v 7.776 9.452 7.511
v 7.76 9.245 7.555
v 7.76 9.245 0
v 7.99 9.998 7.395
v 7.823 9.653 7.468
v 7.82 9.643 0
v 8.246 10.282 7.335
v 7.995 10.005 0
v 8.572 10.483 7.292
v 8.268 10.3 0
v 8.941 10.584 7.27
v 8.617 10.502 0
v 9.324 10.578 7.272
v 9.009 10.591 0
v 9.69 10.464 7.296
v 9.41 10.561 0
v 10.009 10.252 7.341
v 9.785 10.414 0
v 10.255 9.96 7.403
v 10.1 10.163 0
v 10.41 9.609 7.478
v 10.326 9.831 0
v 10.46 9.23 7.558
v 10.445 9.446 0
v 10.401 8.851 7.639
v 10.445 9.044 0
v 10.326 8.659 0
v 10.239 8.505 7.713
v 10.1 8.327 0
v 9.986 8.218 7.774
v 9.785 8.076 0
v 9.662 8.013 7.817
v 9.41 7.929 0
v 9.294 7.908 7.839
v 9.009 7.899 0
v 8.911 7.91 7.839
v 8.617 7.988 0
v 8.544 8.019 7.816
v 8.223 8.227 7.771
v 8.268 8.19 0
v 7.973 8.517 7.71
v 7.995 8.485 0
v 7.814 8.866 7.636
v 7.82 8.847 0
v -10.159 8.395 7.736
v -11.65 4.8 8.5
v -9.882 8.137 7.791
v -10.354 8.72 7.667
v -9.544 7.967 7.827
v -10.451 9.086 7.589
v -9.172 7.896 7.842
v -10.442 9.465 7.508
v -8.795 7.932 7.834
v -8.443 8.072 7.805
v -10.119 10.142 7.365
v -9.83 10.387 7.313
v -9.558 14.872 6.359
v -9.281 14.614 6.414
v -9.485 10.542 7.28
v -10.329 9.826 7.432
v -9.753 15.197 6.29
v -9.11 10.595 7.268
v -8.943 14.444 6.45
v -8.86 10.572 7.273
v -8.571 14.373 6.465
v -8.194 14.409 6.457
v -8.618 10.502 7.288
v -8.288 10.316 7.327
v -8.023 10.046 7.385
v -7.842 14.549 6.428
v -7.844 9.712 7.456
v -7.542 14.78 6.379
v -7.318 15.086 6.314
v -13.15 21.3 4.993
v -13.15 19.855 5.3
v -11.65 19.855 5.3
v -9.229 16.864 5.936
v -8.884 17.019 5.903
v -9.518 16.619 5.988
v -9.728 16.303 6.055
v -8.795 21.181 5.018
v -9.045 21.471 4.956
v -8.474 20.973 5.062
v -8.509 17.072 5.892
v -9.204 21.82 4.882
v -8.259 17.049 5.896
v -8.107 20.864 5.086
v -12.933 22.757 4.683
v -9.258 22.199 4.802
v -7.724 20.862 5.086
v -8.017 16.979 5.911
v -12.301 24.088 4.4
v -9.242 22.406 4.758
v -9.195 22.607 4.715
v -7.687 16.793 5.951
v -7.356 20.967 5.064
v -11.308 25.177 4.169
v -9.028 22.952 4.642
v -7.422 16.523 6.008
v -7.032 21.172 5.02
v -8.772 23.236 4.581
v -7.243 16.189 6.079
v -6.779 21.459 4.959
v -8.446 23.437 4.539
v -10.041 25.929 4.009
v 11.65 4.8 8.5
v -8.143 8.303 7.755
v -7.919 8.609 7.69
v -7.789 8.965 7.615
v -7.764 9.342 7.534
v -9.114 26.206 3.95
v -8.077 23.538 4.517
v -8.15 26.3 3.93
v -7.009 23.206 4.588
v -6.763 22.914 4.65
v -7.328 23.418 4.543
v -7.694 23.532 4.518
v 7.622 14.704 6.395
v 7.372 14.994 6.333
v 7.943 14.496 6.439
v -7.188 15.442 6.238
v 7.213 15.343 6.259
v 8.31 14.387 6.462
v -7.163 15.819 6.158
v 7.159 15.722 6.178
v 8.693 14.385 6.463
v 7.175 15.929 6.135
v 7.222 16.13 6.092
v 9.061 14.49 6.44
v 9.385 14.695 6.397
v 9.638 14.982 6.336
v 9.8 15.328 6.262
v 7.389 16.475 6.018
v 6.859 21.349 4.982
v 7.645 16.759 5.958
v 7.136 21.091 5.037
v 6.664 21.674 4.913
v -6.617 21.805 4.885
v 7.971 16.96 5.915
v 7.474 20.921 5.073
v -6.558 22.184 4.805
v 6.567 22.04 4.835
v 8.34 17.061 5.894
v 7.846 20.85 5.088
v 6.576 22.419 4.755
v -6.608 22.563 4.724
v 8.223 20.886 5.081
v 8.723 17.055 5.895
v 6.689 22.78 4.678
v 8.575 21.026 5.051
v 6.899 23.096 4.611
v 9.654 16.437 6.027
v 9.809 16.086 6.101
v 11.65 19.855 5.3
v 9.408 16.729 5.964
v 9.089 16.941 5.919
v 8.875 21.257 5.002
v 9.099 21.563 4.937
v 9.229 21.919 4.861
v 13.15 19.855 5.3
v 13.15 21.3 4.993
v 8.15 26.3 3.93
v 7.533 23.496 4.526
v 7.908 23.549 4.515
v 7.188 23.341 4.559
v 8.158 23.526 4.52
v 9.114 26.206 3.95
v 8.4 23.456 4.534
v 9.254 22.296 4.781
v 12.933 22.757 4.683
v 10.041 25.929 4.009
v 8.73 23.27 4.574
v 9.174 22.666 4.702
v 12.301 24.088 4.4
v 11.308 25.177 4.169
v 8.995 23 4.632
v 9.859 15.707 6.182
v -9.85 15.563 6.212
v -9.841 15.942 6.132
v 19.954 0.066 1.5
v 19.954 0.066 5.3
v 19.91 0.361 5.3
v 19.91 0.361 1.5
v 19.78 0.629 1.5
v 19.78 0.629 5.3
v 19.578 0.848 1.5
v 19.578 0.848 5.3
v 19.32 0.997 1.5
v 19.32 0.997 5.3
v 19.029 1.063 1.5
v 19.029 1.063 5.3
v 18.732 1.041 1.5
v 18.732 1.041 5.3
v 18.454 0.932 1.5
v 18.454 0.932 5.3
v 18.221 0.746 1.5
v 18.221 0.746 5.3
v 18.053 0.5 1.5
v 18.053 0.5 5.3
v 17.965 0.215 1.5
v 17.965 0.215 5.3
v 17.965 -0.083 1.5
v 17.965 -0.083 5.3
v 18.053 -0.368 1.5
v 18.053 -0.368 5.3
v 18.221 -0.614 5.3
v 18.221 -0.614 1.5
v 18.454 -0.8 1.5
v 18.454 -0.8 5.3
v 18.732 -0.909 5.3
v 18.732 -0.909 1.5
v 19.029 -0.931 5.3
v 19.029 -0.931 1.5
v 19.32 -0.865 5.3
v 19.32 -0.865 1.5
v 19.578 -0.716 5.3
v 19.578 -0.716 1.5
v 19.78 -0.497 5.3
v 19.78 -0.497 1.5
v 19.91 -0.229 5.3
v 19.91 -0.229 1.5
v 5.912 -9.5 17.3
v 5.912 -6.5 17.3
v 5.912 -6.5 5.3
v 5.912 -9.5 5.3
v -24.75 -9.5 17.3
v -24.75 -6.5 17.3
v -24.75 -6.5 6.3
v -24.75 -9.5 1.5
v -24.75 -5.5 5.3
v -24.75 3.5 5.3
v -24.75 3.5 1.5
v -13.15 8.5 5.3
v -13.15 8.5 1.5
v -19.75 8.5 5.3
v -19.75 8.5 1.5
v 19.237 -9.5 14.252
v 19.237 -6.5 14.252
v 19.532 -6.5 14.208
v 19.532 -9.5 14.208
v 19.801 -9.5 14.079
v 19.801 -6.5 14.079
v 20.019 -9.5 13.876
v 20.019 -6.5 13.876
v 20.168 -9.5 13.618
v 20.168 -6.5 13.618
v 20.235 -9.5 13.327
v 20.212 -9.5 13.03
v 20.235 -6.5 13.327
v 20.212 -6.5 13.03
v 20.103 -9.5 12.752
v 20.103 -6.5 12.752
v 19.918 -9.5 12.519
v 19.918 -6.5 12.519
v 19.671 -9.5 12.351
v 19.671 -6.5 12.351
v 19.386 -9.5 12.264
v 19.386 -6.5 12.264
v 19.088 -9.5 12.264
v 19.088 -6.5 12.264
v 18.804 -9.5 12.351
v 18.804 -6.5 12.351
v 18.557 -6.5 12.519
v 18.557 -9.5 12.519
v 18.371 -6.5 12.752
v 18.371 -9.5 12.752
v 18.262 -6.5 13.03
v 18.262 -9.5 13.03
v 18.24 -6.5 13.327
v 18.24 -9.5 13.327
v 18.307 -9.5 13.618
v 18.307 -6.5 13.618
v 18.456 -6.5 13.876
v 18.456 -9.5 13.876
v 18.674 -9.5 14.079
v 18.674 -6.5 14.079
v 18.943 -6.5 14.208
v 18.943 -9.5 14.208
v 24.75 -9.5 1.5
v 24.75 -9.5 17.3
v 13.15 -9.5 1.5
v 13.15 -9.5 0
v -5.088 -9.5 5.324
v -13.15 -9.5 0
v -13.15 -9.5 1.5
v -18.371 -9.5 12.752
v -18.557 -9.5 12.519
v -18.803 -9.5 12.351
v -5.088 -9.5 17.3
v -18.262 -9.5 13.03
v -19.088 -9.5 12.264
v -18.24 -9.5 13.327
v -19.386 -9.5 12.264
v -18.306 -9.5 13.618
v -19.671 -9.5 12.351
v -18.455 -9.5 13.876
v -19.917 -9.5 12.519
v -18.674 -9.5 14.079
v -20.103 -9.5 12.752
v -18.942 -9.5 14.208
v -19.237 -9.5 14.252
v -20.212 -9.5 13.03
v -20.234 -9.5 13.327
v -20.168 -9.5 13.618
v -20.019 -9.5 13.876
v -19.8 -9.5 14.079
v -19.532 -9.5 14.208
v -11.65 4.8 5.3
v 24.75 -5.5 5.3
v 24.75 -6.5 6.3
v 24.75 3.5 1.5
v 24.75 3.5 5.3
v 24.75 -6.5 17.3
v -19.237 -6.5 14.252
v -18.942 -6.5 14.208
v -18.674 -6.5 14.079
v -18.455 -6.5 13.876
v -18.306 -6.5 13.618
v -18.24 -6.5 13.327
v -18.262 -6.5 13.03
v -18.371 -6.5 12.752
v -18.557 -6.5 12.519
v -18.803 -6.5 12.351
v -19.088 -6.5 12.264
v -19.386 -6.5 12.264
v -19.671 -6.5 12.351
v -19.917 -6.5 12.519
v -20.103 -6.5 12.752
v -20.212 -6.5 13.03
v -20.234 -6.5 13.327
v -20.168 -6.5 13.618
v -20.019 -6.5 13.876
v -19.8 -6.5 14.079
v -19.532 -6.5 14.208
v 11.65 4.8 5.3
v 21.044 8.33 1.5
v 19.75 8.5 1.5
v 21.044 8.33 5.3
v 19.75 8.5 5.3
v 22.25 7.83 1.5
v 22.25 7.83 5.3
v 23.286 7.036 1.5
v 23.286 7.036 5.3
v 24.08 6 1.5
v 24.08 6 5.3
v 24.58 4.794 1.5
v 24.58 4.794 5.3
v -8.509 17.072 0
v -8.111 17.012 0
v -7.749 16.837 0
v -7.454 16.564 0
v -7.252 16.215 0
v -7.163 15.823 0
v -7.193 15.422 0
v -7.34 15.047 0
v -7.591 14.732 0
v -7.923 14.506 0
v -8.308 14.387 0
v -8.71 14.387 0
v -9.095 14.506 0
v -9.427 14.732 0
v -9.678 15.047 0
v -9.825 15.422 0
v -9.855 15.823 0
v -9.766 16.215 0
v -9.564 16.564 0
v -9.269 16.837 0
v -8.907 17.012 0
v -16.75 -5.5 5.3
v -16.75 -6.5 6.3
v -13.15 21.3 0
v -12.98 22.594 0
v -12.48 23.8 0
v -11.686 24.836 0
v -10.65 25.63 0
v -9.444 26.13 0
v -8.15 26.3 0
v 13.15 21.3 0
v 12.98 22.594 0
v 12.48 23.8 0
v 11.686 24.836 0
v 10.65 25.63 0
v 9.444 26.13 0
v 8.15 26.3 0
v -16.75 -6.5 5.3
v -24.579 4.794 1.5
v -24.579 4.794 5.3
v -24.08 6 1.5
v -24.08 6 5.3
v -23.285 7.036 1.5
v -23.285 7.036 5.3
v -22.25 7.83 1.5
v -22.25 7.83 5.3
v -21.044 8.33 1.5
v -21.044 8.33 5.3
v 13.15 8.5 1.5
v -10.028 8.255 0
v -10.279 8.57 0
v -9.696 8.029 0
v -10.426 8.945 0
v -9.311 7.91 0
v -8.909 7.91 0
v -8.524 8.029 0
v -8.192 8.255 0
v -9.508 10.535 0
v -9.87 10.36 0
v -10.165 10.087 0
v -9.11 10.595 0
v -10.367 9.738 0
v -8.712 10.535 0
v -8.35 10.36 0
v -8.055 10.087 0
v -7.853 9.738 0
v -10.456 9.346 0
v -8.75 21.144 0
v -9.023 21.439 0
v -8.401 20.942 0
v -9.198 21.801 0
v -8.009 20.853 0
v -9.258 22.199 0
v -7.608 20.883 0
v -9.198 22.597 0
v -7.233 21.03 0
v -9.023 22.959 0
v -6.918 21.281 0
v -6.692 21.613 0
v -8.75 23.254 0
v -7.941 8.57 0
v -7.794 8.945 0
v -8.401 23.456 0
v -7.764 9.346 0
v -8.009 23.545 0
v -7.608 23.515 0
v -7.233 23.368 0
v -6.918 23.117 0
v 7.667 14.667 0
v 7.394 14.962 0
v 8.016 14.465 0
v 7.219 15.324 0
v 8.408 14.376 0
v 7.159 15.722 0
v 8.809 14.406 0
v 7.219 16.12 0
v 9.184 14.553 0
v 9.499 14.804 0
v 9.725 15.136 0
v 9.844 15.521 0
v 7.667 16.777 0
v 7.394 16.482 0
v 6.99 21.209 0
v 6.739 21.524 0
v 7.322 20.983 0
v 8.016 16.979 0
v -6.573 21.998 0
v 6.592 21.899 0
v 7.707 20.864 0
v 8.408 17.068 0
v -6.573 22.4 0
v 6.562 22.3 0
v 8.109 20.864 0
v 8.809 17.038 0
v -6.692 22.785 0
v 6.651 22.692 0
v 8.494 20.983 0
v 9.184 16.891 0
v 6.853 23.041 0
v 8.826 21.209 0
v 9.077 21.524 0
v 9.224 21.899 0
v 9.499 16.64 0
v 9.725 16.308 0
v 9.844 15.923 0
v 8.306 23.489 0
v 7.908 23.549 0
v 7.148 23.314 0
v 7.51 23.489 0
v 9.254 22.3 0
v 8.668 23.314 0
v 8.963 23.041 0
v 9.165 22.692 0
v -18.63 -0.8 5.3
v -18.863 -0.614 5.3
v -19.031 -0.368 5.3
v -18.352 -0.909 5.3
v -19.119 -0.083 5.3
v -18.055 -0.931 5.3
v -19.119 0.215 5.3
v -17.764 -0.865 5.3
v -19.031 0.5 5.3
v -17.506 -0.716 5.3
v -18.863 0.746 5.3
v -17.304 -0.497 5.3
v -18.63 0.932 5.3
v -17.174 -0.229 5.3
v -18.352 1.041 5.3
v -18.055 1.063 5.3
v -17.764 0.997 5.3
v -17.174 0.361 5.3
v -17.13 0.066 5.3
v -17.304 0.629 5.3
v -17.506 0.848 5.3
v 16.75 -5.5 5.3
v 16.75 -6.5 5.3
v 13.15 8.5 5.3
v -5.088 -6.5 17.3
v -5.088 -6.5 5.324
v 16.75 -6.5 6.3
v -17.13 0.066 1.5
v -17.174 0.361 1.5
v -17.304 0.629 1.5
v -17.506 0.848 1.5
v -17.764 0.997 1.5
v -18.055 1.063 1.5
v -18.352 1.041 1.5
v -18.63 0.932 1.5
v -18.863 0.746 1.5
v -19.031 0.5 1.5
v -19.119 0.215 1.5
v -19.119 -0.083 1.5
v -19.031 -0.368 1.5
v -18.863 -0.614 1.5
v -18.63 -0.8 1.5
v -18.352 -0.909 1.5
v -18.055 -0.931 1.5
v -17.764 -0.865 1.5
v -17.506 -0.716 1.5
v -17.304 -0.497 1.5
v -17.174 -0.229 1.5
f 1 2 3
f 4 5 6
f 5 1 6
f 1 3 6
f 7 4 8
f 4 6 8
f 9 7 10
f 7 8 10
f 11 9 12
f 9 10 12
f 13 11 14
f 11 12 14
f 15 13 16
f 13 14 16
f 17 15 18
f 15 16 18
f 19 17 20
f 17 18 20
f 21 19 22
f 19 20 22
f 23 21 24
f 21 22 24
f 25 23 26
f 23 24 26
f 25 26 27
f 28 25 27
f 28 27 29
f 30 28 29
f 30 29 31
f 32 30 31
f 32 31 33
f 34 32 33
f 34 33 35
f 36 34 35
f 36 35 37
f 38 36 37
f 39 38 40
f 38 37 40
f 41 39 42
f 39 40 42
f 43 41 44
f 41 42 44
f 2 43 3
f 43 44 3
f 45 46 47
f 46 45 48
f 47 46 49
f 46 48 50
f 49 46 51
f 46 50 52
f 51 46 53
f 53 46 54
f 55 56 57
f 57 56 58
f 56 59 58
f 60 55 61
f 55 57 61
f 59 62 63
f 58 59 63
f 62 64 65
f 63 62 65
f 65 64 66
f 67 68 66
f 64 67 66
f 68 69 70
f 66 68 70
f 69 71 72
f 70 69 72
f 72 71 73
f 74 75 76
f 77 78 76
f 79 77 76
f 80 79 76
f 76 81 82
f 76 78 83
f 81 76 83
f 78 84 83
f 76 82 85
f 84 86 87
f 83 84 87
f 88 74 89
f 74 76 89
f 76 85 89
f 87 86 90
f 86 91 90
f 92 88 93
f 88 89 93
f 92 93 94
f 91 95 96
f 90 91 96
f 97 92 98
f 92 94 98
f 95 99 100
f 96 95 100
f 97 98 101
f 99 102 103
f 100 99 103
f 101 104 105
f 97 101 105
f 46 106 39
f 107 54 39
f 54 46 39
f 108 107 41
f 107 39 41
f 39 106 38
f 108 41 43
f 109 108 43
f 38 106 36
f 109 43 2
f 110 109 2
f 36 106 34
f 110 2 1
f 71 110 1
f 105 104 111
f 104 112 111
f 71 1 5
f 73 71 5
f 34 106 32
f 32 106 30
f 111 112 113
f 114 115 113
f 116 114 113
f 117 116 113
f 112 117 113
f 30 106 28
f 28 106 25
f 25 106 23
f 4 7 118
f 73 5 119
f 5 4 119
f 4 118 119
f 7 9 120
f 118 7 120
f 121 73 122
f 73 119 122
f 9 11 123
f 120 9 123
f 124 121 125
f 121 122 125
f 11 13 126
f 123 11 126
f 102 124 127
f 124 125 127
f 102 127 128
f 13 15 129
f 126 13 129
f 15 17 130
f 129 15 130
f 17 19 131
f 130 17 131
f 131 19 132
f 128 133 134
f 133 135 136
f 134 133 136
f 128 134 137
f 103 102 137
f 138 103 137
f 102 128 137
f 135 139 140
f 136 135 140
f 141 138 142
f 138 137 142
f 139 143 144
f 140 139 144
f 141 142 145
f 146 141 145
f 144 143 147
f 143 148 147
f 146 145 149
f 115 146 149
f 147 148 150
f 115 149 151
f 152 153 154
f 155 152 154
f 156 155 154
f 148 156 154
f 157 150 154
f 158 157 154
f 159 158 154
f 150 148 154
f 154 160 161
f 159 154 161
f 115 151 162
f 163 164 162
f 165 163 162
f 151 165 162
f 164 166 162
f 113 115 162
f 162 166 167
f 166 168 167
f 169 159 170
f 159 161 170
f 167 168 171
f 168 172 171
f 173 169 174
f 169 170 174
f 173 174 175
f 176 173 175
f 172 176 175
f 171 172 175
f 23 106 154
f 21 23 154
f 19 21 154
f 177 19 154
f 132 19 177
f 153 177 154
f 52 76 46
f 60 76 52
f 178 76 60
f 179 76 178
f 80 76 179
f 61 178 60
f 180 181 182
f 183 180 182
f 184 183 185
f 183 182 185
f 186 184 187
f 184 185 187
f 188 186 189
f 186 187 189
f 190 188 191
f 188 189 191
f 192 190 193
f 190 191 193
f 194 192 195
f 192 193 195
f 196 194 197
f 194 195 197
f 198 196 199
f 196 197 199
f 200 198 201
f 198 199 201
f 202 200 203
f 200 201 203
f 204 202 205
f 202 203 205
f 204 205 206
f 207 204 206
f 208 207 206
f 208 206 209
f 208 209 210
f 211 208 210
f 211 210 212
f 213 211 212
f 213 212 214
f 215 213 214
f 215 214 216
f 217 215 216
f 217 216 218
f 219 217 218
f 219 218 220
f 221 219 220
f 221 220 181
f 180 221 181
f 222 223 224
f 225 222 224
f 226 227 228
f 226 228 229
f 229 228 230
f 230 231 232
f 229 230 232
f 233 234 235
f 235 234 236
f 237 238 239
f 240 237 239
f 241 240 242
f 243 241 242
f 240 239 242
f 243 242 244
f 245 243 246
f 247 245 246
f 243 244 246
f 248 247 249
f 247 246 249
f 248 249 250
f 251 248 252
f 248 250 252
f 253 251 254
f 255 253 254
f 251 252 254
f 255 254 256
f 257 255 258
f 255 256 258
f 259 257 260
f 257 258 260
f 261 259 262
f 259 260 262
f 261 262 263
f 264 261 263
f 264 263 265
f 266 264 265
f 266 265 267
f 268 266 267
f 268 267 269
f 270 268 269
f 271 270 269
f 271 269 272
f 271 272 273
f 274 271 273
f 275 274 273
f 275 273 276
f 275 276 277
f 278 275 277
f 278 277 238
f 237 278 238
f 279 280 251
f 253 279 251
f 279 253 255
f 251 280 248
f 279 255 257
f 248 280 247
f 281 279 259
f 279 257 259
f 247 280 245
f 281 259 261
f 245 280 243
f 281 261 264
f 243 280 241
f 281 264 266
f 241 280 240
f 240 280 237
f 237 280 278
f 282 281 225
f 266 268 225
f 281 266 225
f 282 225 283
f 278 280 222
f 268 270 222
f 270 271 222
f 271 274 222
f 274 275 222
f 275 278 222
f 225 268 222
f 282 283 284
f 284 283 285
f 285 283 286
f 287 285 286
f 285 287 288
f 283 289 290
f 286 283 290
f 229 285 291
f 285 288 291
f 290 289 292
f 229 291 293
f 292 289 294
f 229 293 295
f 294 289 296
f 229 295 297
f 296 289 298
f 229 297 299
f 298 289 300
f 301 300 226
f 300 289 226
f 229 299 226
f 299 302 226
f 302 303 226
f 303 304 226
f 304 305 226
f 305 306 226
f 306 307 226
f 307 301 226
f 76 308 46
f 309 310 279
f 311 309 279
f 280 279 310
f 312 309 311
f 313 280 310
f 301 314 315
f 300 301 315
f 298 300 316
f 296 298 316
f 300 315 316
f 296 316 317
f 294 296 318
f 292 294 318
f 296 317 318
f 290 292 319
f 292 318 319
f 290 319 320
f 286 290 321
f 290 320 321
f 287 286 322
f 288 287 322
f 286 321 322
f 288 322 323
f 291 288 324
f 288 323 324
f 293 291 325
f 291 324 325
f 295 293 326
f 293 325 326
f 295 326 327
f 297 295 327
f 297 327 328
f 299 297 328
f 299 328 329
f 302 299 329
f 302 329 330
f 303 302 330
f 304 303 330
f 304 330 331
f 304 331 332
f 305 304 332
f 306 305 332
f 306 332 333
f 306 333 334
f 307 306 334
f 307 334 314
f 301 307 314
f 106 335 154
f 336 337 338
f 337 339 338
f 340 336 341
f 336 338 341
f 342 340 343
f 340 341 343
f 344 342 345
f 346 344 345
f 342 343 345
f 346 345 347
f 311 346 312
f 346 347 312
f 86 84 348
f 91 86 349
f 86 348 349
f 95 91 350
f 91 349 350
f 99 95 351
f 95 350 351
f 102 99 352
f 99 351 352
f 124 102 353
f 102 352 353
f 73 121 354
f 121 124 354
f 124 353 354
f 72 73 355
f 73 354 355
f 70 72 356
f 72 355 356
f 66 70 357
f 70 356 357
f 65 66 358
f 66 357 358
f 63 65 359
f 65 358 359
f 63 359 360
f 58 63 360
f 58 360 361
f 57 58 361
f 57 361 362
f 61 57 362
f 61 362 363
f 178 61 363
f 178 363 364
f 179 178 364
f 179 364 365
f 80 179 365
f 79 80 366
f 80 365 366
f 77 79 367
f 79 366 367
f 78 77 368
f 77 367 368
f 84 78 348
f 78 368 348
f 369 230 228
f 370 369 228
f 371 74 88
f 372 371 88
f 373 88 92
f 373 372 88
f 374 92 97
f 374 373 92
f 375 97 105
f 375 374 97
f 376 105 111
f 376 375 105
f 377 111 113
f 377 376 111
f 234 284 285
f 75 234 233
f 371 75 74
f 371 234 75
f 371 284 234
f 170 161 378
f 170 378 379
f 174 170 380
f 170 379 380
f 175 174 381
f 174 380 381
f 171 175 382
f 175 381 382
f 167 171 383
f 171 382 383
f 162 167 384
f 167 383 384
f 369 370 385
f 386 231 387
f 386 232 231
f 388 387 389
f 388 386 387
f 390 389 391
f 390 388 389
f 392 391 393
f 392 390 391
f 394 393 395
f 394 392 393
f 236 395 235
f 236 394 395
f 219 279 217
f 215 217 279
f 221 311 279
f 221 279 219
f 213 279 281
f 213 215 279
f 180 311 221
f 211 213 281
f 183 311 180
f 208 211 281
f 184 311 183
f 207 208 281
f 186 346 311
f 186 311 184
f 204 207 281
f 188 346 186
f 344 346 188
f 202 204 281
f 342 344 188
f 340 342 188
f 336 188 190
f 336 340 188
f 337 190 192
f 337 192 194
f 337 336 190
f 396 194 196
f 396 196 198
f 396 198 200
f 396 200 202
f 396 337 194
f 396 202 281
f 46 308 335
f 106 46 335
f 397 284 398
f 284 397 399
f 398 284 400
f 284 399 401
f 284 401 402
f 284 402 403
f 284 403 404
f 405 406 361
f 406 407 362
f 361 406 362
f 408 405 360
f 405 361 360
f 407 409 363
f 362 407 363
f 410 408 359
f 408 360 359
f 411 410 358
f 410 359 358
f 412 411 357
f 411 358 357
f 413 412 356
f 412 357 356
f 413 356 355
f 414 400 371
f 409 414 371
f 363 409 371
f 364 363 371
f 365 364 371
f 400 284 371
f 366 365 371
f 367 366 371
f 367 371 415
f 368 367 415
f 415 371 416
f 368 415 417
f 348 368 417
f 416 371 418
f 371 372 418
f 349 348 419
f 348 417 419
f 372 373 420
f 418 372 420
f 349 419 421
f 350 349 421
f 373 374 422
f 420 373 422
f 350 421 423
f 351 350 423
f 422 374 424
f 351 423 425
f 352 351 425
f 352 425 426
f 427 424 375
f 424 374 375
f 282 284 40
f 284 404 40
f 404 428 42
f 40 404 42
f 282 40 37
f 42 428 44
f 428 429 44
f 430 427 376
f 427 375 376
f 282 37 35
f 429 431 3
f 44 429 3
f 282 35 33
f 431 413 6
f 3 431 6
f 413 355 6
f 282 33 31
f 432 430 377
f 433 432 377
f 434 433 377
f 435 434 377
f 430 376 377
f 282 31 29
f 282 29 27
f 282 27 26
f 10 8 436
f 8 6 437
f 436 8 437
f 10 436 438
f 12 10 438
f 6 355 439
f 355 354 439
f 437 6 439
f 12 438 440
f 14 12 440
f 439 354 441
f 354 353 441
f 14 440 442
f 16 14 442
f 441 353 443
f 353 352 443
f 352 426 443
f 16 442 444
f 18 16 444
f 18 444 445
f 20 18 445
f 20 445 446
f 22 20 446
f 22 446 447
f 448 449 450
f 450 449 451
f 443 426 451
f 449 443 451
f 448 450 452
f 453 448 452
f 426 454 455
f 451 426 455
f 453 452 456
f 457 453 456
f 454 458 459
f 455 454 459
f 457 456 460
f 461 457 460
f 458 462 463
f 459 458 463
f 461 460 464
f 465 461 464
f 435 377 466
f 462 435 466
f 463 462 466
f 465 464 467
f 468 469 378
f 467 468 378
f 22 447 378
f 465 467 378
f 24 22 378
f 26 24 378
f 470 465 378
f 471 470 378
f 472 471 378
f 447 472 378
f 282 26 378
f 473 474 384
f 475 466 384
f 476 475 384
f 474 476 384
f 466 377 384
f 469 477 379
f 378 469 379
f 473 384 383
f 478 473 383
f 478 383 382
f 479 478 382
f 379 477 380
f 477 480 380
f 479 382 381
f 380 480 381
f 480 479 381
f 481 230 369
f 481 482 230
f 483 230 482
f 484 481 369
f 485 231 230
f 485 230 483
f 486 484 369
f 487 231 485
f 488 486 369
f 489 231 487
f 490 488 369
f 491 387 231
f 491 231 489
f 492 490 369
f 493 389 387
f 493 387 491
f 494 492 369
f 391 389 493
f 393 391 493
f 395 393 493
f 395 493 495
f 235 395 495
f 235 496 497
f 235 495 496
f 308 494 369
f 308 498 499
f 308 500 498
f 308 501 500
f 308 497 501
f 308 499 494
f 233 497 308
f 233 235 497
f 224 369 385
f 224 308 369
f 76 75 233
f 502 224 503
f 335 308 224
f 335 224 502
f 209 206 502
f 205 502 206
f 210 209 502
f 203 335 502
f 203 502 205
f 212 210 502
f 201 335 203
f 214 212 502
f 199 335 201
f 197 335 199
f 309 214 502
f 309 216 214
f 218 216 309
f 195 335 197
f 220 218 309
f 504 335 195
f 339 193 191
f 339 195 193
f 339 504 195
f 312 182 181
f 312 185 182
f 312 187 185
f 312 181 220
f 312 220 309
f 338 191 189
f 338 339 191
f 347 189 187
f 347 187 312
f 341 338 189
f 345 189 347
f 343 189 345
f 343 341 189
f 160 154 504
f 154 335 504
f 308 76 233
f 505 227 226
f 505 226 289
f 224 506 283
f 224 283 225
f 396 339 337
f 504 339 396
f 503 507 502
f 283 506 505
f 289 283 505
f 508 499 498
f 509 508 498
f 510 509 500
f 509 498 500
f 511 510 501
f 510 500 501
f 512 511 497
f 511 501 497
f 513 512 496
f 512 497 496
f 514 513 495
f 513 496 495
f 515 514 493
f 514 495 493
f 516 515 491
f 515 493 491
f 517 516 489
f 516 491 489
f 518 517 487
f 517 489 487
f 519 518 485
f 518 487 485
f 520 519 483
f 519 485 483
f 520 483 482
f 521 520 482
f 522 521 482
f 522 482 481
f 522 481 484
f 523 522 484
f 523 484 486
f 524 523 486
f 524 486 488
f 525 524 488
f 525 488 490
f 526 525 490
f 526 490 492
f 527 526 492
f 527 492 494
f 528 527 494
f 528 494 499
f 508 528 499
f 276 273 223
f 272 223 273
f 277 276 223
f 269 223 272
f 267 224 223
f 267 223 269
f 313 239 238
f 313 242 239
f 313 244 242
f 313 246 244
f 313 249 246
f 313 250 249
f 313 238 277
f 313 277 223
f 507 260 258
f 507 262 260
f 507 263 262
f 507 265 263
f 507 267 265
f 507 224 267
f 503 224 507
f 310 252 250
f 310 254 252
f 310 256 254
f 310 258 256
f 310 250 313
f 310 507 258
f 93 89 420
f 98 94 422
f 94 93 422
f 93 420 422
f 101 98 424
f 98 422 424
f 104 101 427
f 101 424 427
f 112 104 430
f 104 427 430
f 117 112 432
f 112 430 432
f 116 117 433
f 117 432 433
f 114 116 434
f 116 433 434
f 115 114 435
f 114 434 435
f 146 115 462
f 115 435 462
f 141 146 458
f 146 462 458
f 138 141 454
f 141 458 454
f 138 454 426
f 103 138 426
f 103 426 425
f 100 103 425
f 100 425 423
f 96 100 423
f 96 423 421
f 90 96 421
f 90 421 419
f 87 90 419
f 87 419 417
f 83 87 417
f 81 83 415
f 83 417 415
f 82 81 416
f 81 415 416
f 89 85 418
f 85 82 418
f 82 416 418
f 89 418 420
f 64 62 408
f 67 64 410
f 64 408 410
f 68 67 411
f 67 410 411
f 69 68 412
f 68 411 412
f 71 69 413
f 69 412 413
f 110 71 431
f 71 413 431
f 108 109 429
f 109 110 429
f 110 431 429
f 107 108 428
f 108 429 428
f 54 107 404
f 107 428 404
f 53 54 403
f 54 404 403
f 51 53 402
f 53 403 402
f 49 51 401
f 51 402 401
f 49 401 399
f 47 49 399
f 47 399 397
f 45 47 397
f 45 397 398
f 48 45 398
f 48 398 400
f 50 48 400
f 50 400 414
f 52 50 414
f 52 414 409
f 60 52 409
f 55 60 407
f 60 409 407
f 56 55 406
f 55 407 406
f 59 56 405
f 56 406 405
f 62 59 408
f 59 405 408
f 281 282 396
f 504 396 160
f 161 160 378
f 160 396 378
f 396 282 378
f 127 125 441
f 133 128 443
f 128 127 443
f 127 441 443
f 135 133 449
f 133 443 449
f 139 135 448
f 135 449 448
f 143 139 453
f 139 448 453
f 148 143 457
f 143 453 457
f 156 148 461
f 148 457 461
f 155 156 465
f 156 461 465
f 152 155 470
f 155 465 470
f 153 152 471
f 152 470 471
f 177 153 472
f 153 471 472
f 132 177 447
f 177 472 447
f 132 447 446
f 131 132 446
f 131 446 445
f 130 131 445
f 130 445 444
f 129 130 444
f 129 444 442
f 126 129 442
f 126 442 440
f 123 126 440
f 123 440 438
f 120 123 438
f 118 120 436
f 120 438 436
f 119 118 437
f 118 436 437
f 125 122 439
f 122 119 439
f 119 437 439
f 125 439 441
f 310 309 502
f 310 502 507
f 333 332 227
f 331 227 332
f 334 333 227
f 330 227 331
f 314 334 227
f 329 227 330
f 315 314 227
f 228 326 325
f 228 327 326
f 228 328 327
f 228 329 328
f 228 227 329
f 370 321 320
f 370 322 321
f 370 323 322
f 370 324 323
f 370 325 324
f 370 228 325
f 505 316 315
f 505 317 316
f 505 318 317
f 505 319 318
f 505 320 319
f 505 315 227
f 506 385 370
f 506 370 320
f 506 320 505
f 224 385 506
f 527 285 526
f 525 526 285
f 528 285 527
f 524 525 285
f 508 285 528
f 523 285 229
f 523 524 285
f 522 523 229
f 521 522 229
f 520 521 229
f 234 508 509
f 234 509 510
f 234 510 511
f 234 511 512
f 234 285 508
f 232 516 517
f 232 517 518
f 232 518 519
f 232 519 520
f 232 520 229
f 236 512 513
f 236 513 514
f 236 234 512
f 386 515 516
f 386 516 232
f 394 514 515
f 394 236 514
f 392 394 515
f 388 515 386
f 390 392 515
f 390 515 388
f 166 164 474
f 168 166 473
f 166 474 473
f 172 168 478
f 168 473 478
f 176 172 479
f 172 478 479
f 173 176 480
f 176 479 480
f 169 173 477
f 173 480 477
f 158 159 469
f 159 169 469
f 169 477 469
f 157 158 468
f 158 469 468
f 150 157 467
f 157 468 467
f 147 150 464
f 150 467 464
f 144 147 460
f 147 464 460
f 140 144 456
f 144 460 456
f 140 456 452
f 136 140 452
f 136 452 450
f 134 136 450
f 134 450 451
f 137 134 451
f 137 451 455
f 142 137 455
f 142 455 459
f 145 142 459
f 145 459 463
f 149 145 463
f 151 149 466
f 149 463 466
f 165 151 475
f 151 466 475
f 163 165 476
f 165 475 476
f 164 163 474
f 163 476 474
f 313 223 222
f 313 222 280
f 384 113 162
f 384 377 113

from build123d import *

# Parameters (mm, degrees)
RESSALTO_EXTRUS_O1_DEPTH          = 3.5
RESSALTO_EXTRUS_O2_DEPTH          = 1.8
ESBO_O5_W                         = 49.5
ESBO_O5_H                         = 3
RESSALTO_EXTRUS_O3_DEPTH          = 12
ESBO_O6_W                         = 1.5
ESBO_O6_H                         = 17.8
RESSALTO_EXTRUS_O4_DEPTH          = 1.8
ESBO_O7_R                         = 1
CORTE_EXTRUS_O2_DEPTH             = 45.583701426
CORTE_EXTRUS_O4_DEPTH             = 45.583701426
RESSALTO_EXTRUS_O5_DEPTH          = 8
RESSALTO_EXTRUS_O6_DEPTH          = 8
ESBO_O12_W                        = 11.60028147
ESBO_O12_H                        = 18
ESBO_O12_W_2                      = 11.59971853
RESSALTO_EXTRUS_O7_DEPTH          = 2
ESBO_O4_R                         = 1
CORTE_EXTRUS_O1_DEPTH             = 10
ESBO_O14_W                        = 23.3
ESBO_O14_H                        = 21.5
RESSALTO_EXTRUS_O8_DEPTH          = 5
CORTE_EXTRUS_O5_REACH             = 50.124
CORTE_EXTRUS_O5_DIRECTION_2_DEPTH = 10
CORTE_EXTRUS_O6_REACH             = 42.044
ESBO_O16_R                        = 1.35
FILETE1_R                         = 5


with BuildPart() as part:
    # Esbo_o1 → Ressalto-extrus_o1 (new body)
    with BuildSketch(Plane.XY):
        Polygon((-13.15, -9.5), (13.15, -9.5), (13.15, 6.5), (13.15, 26.3), (-13.15, 26.3), (-13.15, 6.5), align=None)
    extrude(amount=RESSALTO_EXTRUS_O1_DEPTH)

    # Esbo_o2 → Ressalto-extrus_o2 (add)
    with BuildSketch(Plane.XY.offset(3.5)):
        Polygon((24.75028147, 8.5), (11.65, 8.5), (11.65, 4.8), (-11.65, 4.8), (-11.65, 8.5), (-24.74971853, 8.5), (-24.74971853, -9.5), (-11.65, -9.5), (10.65, -9.5), (24.75028147, -9.5), align=None)
    extrude(amount=RESSALTO_EXTRUS_O2_DEPTH)

    # Esbo_o5 → Ressalto-extrus_o3 (add)
    with BuildSketch(Plane.XY.offset(5.3)):
        with Locations((0.00028147, -8)):
            Rectangle(ESBO_O5_W, ESBO_O5_H)
    extrude(amount=RESSALTO_EXTRUS_O3_DEPTH)

    # Esbo_o6 → Ressalto-extrus_o4 (add)
    with BuildSketch(Plane.XY.offset(3.5)):
        with Locations((-12.4, 17.4)):
            Rectangle(ESBO_O6_W, ESBO_O6_H)
        with Locations((12.4, 17.4)):
            Rectangle(ESBO_O6_W, ESBO_O6_H)
    extrude(amount=RESSALTO_EXTRUS_O4_DEPTH)

    # Esbo_o7 → Corte-extrus_o2 (cut, through all)
    with BuildSketch(Plane(origin=(0, -6.5, 0), x_dir=(1, 0, 0), z_dir=(0, 1, 0))):
        with Locations(Location((19.237396406, -13.252377825, 0), (0, 0, 270))):
            Circle(ESBO_O7_R)
        with Locations(Location((-19.236833466, -13.252377825, 0), (0, 0, 270))):
            Circle(ESBO_O7_R)
    extrude(amount=-CORTE_EXTRUS_O2_DEPTH, mode=Mode.SUBTRACT)

    # Esbo_o9 → Corte-extrus_o4 (cut, through all)
    with BuildSketch(Plane(origin=(0, -6.5, 0), x_dir=(1, 0, 0), z_dir=(0, 1, 0))):
        Polygon((-5.087829915, -5.323896898), (5.912170085, -5.3), (5.912170085, -14.390715249), (5.912170085, -17.3), (-5.087829915, -17.3), (-5.087829915, -14.390715249), align=None)
    extrude(amount=-CORTE_EXTRUS_O4_DEPTH, mode=Mode.SUBTRACT)

    # Esbo_o10 → Ressalto-extrus_o5 (add)
    with BuildSketch(Plane(origin=(24.75028147, 0, 0), x_dir=(0, 0, -1), z_dir=(1, 0, 0))):
        Polygon((-6.3, -6.5), (-5.3, -6.5), (-5.3, -5.5), align=None)
    extrude(amount=-RESSALTO_EXTRUS_O5_DEPTH)

    # Esbo_o11 → Ressalto-extrus_o6 (add)
    with BuildSketch(Plane.ZY.offset(24.74971853)):
        Polygon((5.3, -5.5), (6.3, -6.5), (5.3, -6.5), align=None)
    extrude(amount=-RESSALTO_EXTRUS_O6_DEPTH)

    # Esbo_o12 → Ressalto-extrus_o7 (add)
    with BuildSketch(Plane(origin=(0, 0, 3.5), x_dir=(-1, 0, 0), z_dir=(0, 0, -1))):
        with Locations((-18.950140735, -0.5)):
            Rectangle(ESBO_O12_W, ESBO_O12_H)
        with Locations((18.949859265, -0.5)):
            Rectangle(ESBO_O12_W_2, ESBO_O12_H)
    extrude(amount=RESSALTO_EXTRUS_O7_DEPTH)

    # Esbo_o4 → Corte-extrus_o1 (cut)
    with BuildSketch(Plane.XY.offset(5.3)):
        with Locations((-18.129829915, 0.0659)):
            Circle(ESBO_O4_R)
        with Locations((18.954170085, 0.0659)):
            Circle(ESBO_O4_R)
    extrude(amount=-CORTE_EXTRUS_O1_DEPTH, mode=Mode.SUBTRACT)

    # Esbo_o14 → Ressalto-extrus_o8 (add)
    with BuildSketch(Plane.XY.offset(3.5)):
        with Locations((0, 15.55)):
            Rectangle(ESBO_O14_W, ESBO_O14_H)
    extrude(amount=RESSALTO_EXTRUS_O8_DEPTH)

    # Esbo_o15 → Corte-extrus_o5 (cut, up to next)
    with BuildSketch(Plane(origin=(11.65, 0, 0), x_dir=(0, 0, -1), z_dir=(1, 0, 0)), mode=Mode.PRIVATE) as corte_extrus_o5_sk1:
        Polygon((-8.5, 26.3), (-8.5, 4.8), (-3.930033924, 26.3), align=None)
    corte_extrus_o5_tool1 = extrude(corte_extrus_o5_sk1.sketch, amount=-CORTE_EXTRUS_O5_REACH, mode=Mode.PRIVATE) & part.part
    add(corte_extrus_o5_tool1.solids().sort_by_distance((11.65, 19.133333, 6.976678))[0], mode=Mode.SUBTRACT)

    # Esbo_o15 → Corte-extrus_o5 direction 2 (cut)
    with BuildSketch(Plane(origin=(11.65, 0, 0), x_dir=(0, 0, -1), z_dir=(1, 0, 0))):
        Polygon((-8.5, 26.3), (-8.5, 4.8), (-3.930033924, 26.3), align=None)
    extrude(amount=CORTE_EXTRUS_O5_DIRECTION_2_DEPTH, mode=Mode.SUBTRACT)

    # Corte-extrus_o6: up to this plane
    corte_extrus_o6_end = Plane(origin=(21.65, 4.8, 8.5), z_dir=(0, 0.20791169081775246, 0.9781476007338071))
    # Esbo_o16 → Corte-extrus_o6 (cut, up to the surface)
    with BuildSketch(Plane(origin=(0, 0, 0), x_dir=(-1, 0, 0), z_dir=(0, 0, -1)), mode=Mode.PRIVATE) as corte_extrus_o6_sk1:
        with Locations((7.908, 22.199)):
            Circle(ESBO_O16_R)
    corte_extrus_o6_tool1 = split(extrude(corte_extrus_o6_sk1.sketch, amount=-CORTE_EXTRUS_O6_REACH, mode=Mode.PRIVATE), bisect_by=corte_extrus_o6_end, keep=Keep.BOTH, mode=Mode.PRIVATE)
    add(corte_extrus_o6_tool1.solids().sort_by_distance((-7.908, 22.199, 0))[0], mode=Mode.SUBTRACT)
    # Esbo_o16 → Corte-extrus_o6 (cut, up to the surface)
    with BuildSketch(Plane(origin=(0, 0, 0), x_dir=(-1, 0, 0), z_dir=(0, 0, -1)), mode=Mode.PRIVATE) as corte_extrus_o6_sk2:
        with Locations((-9.11, 9.245)):
            Circle(ESBO_O16_R)
    corte_extrus_o6_tool2 = split(extrude(corte_extrus_o6_sk2.sketch, amount=-CORTE_EXTRUS_O6_REACH, mode=Mode.PRIVATE), bisect_by=corte_extrus_o6_end, keep=Keep.BOTH, mode=Mode.PRIVATE)
    add(corte_extrus_o6_tool2.solids().sort_by_distance((9.11, 9.245, 0))[0], mode=Mode.SUBTRACT)
    # Esbo_o16 → Corte-extrus_o6 (cut, up to the surface)
    with BuildSketch(Plane(origin=(0, 0, 0), x_dir=(-1, 0, 0), z_dir=(0, 0, -1)), mode=Mode.PRIVATE) as corte_extrus_o6_sk3:
        with Locations(Location((9.11, 9.245, 0), (0, 0, 90))):
            Circle(ESBO_O16_R)
    corte_extrus_o6_tool3 = split(extrude(corte_extrus_o6_sk3.sketch, amount=-CORTE_EXTRUS_O6_REACH, mode=Mode.PRIVATE), bisect_by=corte_extrus_o6_end, keep=Keep.BOTH, mode=Mode.PRIVATE)
    add(corte_extrus_o6_tool3.solids().sort_by_distance((-9.11, 9.245, 0))[0], mode=Mode.SUBTRACT)
    # Esbo_o16 → Corte-extrus_o6 (cut, up to the surface)
    with BuildSketch(Plane(origin=(0, 0, 0), x_dir=(-1, 0, 0), z_dir=(0, 0, -1)), mode=Mode.PRIVATE) as corte_extrus_o6_sk4:
        with Locations(Location((-7.908, 22.199, 0), (0, 0, 90))):
            Circle(ESBO_O16_R)
    corte_extrus_o6_tool4 = split(extrude(corte_extrus_o6_sk4.sketch, amount=-CORTE_EXTRUS_O6_REACH, mode=Mode.PRIVATE), bisect_by=corte_extrus_o6_end, keep=Keep.BOTH, mode=Mode.PRIVATE)
    add(corte_extrus_o6_tool4.solids().sort_by_distance((7.908, 22.199, 0))[0], mode=Mode.SUBTRACT)
    # Esbo_o16 → Corte-extrus_o6 (cut, up to the surface)
    with BuildSketch(Plane(origin=(0, 0, 0), x_dir=(-1, 0, 0), z_dir=(0, 0, -1)), mode=Mode.PRIVATE) as corte_extrus_o6_sk5:
        with Locations((-8.509, 15.722)):
            Circle(ESBO_O16_R)
    corte_extrus_o6_tool5 = split(extrude(corte_extrus_o6_sk5.sketch, amount=-CORTE_EXTRUS_O6_REACH, mode=Mode.PRIVATE), bisect_by=corte_extrus_o6_end, keep=Keep.BOTH, mode=Mode.PRIVATE)
    add(corte_extrus_o6_tool5.solids().sort_by_distance((8.509, 15.722, 0))[0], mode=Mode.SUBTRACT)
    # Esbo_o16 → Corte-extrus_o6 (cut, up to the surface)
    with BuildSketch(Plane(origin=(0, 0, 0), x_dir=(-1, 0, 0), z_dir=(0, 0, -1)), mode=Mode.PRIVATE) as corte_extrus_o6_sk6:
        with Locations(Location((8.509, 15.722, 0), (0, 0, 90))):
            Circle(ESBO_O16_R)
    corte_extrus_o6_tool6 = split(extrude(corte_extrus_o6_sk6.sketch, amount=-CORTE_EXTRUS_O6_REACH, mode=Mode.PRIVATE), bisect_by=corte_extrus_o6_end, keep=Keep.BOTH, mode=Mode.PRIVATE)
    add(corte_extrus_o6_tool6.solids().sort_by_distance((-8.509, 15.722, 0))[0], mode=Mode.SUBTRACT)

    # Filete1
    filete1_edges = [part.edges().sort_by_distance(p)[0] for p in [
        (24.75028147, 8.5, 3.4),
        (-24.74971853, 8.5, 3.4),
        (-13.15, 26.3, 1.965016962),
        (13.15, 26.3, 1.965016962),
    ]]
    fillet(filete1_edges, radius=FILETE1_R)


solid = part.part
